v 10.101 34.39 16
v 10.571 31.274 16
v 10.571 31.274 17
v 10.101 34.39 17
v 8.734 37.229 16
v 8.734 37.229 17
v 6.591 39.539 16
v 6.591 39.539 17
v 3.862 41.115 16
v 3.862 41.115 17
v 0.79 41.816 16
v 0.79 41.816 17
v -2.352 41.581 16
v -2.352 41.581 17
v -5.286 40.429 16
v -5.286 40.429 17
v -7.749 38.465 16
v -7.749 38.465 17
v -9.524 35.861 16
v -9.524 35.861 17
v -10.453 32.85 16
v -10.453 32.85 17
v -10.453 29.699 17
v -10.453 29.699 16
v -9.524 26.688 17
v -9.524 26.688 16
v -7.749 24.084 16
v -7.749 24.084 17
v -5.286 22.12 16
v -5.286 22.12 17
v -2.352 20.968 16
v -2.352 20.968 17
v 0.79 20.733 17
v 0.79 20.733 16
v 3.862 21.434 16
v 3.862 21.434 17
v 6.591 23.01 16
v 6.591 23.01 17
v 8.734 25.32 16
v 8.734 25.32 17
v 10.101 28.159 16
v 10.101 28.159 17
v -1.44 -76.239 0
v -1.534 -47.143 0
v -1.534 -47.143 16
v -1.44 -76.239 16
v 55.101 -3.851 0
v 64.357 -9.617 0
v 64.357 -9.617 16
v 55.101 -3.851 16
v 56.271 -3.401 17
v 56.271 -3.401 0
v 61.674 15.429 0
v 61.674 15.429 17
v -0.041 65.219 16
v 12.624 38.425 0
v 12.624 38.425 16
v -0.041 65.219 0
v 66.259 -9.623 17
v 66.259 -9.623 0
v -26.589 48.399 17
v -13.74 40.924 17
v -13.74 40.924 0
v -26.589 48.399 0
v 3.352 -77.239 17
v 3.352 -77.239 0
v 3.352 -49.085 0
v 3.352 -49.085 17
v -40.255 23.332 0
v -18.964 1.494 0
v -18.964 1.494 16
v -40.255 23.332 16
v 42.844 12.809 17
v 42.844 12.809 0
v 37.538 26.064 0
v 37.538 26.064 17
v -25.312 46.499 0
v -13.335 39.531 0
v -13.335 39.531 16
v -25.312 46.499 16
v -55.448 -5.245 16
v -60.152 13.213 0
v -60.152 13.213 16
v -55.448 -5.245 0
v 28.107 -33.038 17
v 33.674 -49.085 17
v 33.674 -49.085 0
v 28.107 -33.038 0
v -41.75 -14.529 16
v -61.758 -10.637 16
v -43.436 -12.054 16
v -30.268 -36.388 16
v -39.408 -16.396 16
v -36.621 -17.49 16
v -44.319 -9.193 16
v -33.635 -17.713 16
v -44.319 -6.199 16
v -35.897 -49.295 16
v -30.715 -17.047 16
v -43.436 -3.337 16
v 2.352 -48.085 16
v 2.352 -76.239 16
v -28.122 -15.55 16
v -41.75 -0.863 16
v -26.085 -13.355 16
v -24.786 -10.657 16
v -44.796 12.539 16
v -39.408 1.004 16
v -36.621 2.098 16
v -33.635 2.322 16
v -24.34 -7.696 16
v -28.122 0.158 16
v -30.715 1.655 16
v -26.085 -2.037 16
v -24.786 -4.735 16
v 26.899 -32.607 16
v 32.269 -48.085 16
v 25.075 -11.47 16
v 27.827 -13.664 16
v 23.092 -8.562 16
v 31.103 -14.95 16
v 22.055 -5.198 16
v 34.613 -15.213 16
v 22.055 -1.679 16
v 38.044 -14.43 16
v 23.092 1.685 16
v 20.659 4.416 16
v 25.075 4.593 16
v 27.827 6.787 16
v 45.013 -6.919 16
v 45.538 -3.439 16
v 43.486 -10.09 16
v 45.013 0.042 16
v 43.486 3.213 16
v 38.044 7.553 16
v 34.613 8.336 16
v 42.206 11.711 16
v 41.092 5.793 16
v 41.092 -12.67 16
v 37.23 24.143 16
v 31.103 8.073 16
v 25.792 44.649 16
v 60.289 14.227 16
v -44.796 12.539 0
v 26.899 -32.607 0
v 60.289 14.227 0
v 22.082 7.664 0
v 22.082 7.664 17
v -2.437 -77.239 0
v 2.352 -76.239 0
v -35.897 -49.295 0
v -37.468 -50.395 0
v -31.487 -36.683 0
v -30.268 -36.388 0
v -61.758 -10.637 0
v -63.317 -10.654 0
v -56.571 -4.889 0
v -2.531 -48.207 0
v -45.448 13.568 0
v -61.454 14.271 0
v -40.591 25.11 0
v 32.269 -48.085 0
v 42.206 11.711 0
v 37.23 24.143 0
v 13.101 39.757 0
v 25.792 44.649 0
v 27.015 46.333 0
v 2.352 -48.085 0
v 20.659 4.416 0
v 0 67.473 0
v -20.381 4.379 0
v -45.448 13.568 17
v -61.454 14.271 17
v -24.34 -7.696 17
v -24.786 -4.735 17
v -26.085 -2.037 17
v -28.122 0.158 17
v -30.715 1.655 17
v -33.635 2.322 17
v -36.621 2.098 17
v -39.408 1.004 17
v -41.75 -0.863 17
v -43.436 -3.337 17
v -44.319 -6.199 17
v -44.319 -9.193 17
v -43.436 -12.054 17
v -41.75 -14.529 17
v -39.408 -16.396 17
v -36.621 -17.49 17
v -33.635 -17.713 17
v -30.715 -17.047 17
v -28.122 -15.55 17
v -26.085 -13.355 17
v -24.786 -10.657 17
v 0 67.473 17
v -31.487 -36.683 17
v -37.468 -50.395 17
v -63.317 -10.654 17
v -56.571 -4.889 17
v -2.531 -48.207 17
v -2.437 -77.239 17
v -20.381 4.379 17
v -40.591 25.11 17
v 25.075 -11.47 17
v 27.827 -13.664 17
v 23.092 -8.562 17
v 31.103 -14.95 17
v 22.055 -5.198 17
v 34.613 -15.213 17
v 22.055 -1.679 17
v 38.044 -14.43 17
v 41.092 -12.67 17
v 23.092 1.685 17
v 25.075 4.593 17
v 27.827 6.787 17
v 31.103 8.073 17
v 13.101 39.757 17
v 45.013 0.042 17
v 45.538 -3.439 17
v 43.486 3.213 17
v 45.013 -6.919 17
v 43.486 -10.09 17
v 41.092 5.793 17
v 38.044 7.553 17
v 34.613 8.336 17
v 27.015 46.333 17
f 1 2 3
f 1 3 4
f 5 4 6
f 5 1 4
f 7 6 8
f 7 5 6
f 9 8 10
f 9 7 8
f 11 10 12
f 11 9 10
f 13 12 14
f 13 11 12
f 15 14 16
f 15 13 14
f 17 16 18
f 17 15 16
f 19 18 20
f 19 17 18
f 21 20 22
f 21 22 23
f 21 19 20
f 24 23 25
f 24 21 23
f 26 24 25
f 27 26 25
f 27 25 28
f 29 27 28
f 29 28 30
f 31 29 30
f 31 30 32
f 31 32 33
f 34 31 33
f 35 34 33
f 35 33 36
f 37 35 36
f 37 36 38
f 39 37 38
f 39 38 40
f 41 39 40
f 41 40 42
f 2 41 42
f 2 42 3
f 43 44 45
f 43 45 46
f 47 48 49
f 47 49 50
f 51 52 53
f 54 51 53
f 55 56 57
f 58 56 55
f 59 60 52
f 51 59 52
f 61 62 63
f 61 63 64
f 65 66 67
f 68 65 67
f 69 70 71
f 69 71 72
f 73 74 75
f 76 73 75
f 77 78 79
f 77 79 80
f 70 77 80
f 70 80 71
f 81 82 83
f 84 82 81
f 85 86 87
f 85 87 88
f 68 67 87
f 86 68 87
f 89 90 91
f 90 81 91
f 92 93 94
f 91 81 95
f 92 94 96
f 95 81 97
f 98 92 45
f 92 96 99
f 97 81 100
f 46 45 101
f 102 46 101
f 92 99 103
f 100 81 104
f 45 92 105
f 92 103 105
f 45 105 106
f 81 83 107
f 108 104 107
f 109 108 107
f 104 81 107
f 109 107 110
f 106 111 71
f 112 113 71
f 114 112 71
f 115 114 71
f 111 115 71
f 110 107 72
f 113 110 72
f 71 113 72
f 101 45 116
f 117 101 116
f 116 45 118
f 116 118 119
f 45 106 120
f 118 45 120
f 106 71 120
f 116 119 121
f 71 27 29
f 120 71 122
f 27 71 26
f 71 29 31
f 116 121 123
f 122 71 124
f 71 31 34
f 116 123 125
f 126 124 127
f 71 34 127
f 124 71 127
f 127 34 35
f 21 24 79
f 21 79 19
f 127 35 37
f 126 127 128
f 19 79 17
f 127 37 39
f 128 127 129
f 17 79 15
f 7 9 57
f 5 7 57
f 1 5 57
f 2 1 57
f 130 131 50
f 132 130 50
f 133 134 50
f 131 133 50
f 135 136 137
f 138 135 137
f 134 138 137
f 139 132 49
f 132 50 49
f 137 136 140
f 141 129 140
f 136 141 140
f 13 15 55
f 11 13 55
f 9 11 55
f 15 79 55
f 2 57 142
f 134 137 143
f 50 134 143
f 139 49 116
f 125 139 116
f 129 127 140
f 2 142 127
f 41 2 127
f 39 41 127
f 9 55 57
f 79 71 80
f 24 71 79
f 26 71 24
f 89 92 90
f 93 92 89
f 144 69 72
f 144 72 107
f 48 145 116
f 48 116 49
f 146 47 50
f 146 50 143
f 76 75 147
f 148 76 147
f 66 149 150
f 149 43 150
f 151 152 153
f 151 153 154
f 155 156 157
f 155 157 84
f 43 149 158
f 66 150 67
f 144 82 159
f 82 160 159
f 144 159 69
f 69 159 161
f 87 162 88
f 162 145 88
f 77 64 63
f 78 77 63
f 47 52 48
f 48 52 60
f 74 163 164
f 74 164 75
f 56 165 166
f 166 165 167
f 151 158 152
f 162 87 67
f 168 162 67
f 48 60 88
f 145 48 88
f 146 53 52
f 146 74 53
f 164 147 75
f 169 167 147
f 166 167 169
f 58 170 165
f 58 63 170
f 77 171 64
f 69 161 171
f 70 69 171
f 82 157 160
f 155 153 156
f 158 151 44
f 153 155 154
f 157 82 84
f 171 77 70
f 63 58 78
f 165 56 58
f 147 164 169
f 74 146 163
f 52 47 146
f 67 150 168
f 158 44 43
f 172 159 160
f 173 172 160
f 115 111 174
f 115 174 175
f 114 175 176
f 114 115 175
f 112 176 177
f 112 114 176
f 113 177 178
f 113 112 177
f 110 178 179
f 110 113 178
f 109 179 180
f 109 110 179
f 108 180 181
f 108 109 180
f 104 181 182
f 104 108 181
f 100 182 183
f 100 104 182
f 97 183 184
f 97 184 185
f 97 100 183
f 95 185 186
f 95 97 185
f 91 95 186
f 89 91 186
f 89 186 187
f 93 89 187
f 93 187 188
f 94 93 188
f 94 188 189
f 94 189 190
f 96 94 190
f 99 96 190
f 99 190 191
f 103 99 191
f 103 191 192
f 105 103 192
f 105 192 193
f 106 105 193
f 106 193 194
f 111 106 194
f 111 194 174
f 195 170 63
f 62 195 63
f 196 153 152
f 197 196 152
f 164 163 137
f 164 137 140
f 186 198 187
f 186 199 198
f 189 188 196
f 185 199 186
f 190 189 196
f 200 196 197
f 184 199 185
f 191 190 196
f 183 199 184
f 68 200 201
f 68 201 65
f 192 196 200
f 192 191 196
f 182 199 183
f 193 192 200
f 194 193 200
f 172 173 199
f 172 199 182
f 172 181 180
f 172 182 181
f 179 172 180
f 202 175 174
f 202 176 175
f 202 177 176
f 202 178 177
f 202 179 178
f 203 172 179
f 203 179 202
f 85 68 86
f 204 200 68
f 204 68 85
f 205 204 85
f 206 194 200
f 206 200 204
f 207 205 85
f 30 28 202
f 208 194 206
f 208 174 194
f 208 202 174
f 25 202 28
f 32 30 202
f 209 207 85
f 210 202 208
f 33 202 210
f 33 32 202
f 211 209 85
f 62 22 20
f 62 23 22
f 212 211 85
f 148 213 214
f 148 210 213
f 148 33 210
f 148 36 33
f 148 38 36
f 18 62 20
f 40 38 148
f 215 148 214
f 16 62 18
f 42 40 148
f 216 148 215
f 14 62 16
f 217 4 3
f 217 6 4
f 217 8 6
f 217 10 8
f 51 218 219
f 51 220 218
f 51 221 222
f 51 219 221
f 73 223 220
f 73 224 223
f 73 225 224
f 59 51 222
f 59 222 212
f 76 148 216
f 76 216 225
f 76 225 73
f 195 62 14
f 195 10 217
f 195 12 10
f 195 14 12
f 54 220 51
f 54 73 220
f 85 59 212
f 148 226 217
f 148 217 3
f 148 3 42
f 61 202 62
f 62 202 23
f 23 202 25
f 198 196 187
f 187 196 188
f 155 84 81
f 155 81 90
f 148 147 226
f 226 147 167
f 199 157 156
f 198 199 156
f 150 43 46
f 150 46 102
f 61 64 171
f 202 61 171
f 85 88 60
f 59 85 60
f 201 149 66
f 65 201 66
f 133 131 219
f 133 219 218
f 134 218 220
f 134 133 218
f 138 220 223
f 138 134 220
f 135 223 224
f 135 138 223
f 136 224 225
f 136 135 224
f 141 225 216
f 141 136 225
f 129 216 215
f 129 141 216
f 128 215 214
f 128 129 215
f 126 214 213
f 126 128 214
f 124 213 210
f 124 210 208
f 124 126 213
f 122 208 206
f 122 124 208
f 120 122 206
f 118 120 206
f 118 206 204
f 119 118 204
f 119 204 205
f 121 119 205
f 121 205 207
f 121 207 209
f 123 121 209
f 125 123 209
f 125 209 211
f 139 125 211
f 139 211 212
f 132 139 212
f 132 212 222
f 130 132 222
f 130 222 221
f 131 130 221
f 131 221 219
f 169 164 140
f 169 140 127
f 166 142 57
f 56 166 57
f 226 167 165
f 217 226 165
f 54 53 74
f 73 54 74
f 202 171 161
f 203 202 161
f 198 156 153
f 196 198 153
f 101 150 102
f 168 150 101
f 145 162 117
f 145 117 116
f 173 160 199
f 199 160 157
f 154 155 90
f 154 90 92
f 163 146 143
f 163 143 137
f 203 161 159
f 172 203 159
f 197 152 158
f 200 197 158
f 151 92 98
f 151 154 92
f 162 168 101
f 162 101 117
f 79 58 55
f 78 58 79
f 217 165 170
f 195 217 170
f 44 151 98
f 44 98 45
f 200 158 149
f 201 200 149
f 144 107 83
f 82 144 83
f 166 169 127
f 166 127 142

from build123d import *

# Parameters (mm, degrees)
F1_DEPTH = 17
F2_T     = -1
F3_R     = 14.3708631793
F4_DEPTH = 25
F5_R     = 10.5711008848
F5_R_2   = 10.0457234784
F5_R_3   = 11.8075026786
F6_DEPTH = 17


with BuildPart() as f1:
    # F0 (on Top) → F1 (new body)
    with BuildSketch(Plane.XY):
        Polygon((-37.4681577086, -50.3954030573), (-2.5307838805, -48.2072606683), (-2.4370756, -77.2388204932), (3.3520292491, -77.2388204932), (3.3520292491, -49.0849018097), (33.674325794, -49.0849018097), (28.1071402133, -33.0383218825), (66.2586987019, -9.6234139055), (56.2705285847, -3.4012699034), (61.6739653051, 15.4289007187), (42.8437963128, 12.8090493381), (37.5377945602, 26.0640811175), (22.0817681402, 7.6640532352), (27.0145568802, 46.333488356), (13.1010971963, 39.7568419576), (0, 67.4733370543), (-13.7401381508, 40.9238524735), (-26.589423418, 48.39893803), (-20.3813649714, 4.3794875965), (-40.5914485455, 25.1100063324), (-45.4480871558, 13.568257913), (-61.4539161325, 14.2708420753), (-56.5707497299, -4.8887040466), (-63.317425549, -10.6540471315), (-31.4872264862, -36.6830341518), align=None)
    extrude(amount=F1_DEPTH)

    # F2
    f2_openings = [f1.faces().sort_by_distance(p)[0] for p in [
        (-0.409278, -4.179109, 0),
    ]]
    offset(amount=F2_T, openings=f2_openings, kind=Kind.INTERSECTION)

    # F3 (on face) → F4 (cut)
    with BuildSketch(Plane.XY.offset(17)):
        with Locations((0, -27.5635700673)):
            Circle(F3_R)
    extrude(amount=F4_DEPTH, mode=Mode.SUBTRACT)

    # F5 (on Top) → F6 (cut)
    with BuildSketch(Plane.XY):
        with Locations((0, 31.2744565308)):
            Circle(F5_R)
        with Locations((-34.3855284154, -7.6958090067)):
            Circle(F5_R_2)
        with Locations((33.7305627763, -3.4385530744)):
            Circle(F5_R_3)
    extrude(amount=F6_DEPTH, mode=Mode.SUBTRACT)


solid = f1.part
